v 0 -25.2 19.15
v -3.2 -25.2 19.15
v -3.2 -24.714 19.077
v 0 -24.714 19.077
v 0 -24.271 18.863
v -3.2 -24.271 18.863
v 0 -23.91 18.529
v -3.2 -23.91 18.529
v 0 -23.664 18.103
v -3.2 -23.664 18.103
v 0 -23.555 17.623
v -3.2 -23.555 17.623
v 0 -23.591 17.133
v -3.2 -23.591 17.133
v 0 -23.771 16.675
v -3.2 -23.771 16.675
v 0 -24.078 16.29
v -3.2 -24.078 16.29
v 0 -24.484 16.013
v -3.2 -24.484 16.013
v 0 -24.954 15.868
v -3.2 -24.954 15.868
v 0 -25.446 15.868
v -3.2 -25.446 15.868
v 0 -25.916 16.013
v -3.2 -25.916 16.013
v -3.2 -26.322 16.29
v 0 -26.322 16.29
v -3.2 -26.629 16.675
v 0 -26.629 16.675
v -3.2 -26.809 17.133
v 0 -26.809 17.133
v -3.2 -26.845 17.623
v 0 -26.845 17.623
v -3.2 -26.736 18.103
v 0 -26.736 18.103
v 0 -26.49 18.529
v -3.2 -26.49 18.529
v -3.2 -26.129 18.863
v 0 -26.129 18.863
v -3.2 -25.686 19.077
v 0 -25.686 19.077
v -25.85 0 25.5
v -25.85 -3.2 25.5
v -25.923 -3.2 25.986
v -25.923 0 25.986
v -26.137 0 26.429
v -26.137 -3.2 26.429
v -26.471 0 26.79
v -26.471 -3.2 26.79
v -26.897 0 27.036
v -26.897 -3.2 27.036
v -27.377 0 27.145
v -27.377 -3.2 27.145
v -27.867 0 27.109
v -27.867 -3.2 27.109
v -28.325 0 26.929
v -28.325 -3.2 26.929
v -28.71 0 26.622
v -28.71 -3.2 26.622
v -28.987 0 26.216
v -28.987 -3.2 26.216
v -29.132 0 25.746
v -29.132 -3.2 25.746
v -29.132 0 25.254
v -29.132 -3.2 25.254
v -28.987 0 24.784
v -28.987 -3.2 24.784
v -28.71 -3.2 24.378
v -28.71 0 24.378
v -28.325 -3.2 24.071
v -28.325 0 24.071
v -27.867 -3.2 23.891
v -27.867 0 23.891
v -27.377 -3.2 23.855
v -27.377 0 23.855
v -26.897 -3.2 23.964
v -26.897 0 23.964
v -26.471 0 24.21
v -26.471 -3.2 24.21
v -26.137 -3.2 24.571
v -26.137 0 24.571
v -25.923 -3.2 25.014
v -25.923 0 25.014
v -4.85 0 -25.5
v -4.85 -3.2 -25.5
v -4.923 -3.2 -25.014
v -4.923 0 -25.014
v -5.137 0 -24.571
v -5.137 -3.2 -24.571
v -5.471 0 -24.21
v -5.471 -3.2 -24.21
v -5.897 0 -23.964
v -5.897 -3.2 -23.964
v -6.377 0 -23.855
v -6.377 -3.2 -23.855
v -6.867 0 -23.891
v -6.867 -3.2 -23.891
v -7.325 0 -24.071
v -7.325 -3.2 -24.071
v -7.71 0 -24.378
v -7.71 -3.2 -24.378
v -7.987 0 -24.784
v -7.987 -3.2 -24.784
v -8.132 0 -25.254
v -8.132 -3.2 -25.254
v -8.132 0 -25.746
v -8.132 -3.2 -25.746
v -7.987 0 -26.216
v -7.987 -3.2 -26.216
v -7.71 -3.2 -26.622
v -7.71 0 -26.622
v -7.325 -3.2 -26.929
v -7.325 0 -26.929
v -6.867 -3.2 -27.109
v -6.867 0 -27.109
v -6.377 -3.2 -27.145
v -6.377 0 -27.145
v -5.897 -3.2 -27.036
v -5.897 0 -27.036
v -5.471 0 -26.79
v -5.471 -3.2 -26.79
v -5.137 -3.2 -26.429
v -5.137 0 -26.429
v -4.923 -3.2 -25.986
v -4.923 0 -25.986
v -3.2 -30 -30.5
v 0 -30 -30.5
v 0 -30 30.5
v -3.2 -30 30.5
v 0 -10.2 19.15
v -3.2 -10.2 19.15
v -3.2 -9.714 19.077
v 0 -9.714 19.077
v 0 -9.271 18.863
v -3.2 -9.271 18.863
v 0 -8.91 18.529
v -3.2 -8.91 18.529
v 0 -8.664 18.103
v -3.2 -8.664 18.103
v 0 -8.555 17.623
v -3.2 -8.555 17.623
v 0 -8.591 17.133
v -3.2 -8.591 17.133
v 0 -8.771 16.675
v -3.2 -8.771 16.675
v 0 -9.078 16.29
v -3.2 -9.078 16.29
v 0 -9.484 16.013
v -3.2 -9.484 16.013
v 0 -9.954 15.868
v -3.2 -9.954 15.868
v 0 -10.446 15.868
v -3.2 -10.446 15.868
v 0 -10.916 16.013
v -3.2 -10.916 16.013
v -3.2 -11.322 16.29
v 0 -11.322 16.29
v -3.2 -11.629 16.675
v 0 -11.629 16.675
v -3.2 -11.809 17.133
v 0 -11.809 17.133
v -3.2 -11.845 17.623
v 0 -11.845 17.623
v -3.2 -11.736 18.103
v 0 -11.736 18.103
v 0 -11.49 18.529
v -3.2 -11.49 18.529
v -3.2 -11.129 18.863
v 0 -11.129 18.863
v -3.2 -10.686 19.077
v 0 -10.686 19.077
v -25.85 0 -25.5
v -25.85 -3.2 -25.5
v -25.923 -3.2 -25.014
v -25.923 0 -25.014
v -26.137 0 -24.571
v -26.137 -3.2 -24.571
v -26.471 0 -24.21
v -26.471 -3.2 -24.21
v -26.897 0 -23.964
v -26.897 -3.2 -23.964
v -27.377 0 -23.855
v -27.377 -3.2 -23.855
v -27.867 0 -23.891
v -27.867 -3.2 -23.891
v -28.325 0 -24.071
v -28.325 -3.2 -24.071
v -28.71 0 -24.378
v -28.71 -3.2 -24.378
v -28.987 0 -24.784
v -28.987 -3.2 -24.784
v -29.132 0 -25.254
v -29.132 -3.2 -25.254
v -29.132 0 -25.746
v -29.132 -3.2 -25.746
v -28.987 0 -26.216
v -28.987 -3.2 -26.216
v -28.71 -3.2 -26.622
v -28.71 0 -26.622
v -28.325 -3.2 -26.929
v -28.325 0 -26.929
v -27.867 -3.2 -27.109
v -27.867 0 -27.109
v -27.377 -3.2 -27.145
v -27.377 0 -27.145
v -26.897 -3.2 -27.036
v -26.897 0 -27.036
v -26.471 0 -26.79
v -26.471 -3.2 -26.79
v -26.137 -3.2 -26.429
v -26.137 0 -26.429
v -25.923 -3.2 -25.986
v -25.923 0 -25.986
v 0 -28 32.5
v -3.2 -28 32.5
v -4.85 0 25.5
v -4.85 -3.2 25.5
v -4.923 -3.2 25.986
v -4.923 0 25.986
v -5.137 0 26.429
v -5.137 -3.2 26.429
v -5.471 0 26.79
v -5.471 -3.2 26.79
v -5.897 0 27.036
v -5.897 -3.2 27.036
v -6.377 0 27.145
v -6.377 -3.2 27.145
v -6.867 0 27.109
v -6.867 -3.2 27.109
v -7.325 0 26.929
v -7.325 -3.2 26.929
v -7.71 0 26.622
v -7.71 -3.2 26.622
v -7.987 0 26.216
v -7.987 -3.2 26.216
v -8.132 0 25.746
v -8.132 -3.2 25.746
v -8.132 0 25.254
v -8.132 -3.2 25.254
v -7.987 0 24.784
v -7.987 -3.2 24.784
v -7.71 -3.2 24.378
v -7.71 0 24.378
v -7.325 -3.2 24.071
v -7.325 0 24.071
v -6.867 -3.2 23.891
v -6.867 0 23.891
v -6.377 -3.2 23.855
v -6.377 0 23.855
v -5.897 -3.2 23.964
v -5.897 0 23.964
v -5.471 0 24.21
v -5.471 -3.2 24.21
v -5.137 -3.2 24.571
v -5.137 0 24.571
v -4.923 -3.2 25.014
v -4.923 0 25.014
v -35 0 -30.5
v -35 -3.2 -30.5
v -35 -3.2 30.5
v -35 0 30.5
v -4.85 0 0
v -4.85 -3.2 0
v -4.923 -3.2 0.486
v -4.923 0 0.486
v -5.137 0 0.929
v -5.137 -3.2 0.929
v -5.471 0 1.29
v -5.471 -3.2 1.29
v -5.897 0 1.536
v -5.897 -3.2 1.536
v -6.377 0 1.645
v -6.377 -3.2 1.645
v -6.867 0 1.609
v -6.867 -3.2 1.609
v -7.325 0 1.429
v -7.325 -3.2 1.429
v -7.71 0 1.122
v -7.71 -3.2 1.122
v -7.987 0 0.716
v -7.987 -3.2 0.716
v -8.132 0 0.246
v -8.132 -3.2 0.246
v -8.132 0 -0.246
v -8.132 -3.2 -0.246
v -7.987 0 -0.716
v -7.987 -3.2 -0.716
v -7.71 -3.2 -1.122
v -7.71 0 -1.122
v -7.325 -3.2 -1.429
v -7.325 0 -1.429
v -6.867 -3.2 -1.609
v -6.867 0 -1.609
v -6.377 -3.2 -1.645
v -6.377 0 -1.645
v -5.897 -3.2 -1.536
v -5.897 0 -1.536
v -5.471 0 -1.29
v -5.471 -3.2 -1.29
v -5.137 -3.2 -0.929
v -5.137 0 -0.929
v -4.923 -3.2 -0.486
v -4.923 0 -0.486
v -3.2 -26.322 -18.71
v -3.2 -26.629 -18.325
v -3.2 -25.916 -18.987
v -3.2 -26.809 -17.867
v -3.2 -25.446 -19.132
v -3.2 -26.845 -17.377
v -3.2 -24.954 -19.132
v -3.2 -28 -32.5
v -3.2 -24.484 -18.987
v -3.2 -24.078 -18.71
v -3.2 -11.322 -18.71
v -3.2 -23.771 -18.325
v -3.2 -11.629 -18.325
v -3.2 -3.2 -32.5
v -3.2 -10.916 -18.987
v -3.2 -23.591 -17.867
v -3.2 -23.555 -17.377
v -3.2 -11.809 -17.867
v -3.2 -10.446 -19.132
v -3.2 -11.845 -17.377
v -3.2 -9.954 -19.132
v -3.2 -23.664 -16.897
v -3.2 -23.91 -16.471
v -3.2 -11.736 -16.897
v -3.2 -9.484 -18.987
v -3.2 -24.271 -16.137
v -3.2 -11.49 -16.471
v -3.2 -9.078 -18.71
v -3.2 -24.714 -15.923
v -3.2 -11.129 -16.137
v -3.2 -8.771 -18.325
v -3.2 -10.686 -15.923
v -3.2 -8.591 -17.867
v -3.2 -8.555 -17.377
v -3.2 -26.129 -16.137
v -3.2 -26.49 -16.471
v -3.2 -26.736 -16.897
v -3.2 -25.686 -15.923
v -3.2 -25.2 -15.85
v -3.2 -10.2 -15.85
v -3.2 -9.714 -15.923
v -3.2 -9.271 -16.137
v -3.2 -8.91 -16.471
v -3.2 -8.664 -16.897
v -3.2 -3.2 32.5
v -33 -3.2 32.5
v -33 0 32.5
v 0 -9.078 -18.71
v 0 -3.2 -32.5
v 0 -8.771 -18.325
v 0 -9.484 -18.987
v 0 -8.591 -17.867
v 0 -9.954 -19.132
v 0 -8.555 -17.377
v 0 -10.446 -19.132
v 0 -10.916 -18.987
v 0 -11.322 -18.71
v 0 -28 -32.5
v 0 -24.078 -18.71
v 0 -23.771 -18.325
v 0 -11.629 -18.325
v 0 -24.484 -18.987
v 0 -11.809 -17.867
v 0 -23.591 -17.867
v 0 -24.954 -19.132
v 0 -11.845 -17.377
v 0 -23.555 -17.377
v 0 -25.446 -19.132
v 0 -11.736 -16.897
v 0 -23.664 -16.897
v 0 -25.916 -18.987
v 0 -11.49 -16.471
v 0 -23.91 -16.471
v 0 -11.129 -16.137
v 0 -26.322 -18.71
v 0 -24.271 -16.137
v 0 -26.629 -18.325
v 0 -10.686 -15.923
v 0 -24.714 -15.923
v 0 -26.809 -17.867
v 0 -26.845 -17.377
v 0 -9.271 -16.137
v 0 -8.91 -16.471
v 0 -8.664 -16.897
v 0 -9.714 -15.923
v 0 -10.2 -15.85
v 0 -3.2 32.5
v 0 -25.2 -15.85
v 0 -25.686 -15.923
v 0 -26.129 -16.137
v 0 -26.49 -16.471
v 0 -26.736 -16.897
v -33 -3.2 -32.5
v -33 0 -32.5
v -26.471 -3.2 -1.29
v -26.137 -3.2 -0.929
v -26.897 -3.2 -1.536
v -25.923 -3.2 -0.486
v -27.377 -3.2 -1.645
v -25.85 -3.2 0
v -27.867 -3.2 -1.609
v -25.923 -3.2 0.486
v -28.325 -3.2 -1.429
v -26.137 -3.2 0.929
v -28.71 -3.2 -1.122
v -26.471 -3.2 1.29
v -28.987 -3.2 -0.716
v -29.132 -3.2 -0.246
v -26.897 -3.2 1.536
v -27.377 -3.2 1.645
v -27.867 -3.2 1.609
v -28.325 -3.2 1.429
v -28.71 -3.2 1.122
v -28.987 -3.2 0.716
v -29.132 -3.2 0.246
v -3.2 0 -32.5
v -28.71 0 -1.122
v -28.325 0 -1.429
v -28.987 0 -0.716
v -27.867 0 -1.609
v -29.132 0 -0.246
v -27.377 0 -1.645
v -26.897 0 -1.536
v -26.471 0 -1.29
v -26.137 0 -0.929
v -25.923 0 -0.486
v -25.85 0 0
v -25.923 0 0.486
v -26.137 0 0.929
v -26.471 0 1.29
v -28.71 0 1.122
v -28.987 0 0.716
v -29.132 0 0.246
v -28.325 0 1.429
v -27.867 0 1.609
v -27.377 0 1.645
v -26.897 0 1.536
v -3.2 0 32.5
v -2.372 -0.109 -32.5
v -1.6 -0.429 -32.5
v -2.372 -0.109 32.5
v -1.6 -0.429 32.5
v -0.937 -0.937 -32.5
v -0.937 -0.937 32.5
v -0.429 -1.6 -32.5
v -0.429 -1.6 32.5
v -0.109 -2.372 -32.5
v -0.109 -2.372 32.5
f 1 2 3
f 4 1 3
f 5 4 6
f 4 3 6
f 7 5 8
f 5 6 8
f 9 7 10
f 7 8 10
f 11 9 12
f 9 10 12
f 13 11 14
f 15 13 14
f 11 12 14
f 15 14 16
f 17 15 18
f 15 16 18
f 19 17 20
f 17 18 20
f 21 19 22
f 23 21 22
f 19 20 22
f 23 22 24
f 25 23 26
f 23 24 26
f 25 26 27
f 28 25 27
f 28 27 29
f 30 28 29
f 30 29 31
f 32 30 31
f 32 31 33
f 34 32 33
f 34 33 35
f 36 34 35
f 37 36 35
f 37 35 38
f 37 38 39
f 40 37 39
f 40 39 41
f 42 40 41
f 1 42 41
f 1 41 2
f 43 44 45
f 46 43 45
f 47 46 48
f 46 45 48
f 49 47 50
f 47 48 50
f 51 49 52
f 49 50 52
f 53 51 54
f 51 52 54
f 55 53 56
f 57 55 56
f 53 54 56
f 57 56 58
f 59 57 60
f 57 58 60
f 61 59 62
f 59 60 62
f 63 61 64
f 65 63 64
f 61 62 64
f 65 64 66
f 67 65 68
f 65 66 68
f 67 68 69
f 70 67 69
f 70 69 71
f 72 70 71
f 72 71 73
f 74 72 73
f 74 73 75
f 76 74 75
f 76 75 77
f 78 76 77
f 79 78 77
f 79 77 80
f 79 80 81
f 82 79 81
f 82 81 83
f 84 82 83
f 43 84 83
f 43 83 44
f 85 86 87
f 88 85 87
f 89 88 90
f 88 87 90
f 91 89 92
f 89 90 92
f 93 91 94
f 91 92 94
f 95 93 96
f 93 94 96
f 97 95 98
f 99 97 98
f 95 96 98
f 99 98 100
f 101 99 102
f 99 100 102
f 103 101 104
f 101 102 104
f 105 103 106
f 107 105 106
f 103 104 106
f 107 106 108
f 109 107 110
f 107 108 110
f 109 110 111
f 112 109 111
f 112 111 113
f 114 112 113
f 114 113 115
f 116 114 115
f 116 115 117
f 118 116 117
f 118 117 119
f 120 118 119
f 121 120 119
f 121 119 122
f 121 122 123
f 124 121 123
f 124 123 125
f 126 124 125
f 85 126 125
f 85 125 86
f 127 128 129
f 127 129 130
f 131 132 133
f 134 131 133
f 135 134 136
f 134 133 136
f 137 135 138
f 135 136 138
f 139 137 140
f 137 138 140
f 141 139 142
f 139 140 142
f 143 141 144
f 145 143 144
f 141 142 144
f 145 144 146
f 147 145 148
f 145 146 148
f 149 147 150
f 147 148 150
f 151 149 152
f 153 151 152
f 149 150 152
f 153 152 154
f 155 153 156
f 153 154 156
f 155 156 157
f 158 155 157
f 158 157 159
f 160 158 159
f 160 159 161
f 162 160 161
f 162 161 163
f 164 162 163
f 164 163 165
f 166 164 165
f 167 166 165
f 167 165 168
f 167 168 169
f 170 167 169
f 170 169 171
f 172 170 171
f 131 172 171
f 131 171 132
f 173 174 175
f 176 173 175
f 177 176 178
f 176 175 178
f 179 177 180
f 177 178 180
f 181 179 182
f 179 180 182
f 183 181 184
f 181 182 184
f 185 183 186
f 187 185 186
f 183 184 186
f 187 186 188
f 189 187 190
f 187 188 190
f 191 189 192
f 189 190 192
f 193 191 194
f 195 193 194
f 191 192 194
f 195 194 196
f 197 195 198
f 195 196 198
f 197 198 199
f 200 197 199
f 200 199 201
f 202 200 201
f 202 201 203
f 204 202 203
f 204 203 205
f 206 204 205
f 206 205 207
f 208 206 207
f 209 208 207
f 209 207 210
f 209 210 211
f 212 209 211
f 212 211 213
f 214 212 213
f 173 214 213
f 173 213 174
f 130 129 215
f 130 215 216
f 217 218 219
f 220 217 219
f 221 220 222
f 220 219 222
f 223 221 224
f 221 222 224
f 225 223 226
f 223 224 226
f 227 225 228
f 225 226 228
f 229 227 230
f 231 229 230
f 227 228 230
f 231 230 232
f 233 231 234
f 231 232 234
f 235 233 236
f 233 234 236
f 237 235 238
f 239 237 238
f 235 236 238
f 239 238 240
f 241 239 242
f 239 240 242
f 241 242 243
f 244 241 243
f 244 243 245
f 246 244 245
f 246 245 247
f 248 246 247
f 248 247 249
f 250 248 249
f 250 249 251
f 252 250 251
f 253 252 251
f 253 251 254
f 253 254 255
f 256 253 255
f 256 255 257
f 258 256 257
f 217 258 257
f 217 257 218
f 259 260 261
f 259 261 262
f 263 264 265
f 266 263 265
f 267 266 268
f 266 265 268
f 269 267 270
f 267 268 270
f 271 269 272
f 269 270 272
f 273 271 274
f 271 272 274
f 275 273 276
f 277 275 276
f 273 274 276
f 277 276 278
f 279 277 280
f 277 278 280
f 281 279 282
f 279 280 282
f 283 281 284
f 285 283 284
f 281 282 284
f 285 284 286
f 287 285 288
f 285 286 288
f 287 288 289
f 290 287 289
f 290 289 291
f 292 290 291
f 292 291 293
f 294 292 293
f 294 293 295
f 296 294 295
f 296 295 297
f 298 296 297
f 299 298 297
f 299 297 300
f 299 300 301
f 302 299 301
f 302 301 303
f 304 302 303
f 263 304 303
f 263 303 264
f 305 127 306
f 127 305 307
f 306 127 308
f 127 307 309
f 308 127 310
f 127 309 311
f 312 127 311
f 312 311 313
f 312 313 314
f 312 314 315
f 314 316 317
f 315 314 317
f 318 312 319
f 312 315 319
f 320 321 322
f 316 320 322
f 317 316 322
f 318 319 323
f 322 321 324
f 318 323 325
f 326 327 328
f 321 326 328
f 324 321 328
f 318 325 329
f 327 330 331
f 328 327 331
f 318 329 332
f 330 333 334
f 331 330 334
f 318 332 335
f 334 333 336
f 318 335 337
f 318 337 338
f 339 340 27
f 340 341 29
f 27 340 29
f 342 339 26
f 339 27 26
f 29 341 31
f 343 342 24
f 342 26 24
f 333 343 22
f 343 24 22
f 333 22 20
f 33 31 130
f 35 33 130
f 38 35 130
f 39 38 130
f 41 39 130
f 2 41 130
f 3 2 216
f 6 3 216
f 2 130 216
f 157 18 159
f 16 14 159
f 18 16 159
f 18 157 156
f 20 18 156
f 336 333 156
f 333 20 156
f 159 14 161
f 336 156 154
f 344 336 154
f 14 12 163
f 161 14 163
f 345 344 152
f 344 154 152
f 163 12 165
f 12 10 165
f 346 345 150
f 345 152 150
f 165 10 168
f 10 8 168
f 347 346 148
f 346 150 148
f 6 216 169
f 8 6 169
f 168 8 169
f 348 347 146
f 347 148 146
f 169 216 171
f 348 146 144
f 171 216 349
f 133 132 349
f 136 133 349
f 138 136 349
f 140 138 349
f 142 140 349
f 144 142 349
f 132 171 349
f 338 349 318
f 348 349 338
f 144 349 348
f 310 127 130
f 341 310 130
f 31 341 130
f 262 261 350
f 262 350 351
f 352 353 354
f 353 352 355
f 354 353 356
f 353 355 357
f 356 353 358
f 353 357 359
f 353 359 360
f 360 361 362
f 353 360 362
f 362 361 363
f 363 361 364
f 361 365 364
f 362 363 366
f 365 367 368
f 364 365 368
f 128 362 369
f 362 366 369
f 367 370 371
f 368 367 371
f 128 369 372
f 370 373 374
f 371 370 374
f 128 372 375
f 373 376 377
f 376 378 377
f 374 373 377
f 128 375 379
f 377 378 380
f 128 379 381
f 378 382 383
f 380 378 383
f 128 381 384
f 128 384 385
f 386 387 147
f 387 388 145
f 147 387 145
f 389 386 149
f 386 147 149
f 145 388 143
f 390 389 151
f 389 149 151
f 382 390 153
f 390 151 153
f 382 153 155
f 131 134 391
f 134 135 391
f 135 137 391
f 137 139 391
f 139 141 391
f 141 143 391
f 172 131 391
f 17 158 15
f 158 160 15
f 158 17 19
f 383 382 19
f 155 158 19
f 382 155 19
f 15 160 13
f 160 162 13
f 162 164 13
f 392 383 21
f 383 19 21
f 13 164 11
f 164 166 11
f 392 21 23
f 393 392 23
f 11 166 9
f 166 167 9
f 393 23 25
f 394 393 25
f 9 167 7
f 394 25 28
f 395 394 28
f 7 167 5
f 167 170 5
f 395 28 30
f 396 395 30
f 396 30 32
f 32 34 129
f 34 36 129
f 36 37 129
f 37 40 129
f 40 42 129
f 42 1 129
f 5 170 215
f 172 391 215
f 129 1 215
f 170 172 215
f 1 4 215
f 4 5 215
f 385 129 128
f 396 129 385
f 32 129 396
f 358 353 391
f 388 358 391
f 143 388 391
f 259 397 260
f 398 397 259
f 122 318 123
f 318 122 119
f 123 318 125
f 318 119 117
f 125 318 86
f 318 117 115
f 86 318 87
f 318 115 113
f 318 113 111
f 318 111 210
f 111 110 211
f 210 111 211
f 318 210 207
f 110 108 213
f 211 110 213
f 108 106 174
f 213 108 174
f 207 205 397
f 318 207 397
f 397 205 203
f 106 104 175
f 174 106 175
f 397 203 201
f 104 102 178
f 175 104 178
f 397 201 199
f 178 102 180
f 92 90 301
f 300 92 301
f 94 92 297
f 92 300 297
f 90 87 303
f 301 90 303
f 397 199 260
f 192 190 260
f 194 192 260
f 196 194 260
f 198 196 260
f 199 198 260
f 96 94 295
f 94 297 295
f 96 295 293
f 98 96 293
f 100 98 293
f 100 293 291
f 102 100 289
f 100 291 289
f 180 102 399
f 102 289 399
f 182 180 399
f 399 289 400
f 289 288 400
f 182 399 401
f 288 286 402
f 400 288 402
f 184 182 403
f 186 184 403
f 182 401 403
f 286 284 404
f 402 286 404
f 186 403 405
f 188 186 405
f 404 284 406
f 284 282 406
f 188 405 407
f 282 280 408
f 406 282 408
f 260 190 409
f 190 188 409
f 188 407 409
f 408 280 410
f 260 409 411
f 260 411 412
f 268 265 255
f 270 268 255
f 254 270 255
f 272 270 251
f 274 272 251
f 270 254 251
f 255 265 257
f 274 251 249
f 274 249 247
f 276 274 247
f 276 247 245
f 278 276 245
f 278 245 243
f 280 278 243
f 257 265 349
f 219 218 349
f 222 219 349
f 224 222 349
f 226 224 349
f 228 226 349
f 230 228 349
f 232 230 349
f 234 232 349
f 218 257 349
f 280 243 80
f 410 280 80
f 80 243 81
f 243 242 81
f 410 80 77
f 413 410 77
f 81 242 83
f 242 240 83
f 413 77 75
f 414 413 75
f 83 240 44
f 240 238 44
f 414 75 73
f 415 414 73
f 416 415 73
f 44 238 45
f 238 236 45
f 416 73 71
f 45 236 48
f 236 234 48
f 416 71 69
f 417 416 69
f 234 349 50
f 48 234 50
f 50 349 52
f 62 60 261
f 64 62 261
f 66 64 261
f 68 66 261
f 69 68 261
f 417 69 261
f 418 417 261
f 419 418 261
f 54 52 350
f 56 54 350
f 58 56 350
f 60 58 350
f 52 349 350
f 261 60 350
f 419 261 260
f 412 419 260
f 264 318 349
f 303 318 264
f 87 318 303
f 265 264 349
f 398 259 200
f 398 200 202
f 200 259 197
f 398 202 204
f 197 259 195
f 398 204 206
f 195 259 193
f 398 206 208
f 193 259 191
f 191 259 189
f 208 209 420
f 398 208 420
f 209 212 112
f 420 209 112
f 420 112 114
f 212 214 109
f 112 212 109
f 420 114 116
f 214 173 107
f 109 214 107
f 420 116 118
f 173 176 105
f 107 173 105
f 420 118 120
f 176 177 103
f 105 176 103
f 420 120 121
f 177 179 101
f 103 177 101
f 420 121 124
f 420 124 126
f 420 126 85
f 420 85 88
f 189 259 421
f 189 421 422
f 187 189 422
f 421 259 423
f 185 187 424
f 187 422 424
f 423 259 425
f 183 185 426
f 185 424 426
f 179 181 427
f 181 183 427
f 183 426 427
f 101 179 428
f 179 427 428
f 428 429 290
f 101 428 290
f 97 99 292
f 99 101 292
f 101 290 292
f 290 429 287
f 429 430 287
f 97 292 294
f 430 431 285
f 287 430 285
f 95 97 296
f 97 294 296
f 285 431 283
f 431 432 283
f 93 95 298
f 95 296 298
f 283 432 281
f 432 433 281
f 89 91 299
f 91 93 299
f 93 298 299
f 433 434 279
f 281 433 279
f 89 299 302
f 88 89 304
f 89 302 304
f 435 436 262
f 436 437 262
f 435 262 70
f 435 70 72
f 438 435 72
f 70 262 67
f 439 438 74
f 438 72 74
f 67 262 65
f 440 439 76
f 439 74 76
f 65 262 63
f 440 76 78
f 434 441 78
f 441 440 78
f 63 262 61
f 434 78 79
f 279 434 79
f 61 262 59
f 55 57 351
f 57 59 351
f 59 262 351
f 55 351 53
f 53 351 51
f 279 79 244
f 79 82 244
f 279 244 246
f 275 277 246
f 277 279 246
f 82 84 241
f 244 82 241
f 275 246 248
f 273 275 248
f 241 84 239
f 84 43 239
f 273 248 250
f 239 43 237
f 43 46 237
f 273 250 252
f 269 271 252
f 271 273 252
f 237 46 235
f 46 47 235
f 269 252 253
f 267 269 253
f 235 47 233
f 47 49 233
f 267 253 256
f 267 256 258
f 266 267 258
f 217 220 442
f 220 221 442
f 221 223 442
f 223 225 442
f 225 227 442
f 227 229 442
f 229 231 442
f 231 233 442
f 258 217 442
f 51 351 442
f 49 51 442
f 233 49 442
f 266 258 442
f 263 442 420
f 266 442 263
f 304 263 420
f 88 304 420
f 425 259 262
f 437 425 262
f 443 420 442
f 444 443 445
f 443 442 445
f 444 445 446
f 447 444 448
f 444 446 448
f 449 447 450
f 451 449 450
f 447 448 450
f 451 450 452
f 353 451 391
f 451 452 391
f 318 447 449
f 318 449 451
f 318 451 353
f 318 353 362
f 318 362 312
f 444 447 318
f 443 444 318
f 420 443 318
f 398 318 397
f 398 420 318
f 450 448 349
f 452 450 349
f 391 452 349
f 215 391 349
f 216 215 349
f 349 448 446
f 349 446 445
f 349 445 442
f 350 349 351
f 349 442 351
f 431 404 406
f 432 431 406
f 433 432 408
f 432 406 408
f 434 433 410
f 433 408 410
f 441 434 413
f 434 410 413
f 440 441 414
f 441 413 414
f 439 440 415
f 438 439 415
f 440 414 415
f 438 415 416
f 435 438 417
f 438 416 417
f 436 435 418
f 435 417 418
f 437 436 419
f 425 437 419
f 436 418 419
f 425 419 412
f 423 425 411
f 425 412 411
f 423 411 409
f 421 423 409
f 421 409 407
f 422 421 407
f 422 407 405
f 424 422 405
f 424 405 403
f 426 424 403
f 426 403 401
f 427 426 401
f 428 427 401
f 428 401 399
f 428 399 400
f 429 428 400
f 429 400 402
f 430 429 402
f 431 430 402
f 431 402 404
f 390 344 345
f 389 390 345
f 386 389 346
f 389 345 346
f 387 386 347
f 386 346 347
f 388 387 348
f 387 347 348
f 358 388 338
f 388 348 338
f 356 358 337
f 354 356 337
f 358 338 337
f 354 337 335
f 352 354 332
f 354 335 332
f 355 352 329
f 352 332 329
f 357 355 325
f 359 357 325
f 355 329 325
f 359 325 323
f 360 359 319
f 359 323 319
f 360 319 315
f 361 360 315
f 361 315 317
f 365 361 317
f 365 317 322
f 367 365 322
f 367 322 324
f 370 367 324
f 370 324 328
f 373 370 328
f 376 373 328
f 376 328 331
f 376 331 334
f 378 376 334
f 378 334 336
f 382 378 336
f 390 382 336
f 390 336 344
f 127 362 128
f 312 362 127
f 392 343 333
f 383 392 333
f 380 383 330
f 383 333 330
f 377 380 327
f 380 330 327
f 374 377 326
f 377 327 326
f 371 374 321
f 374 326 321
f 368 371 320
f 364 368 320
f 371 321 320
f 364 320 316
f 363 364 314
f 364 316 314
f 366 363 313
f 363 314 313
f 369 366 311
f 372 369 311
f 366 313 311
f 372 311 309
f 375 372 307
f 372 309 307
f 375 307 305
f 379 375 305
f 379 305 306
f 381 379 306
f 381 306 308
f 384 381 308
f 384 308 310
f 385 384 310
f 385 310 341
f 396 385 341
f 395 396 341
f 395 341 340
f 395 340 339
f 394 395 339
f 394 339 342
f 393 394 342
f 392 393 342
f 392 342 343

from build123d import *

# Parameters (mm, degrees)
BOSS_EXTRUDE1_DEPTH       = 32.5
BOSS_EXTRUDE1_DEPTH_BACK  = 32.5
FILLET1_R                 = 3.2
M4X0_7_TAPPED_HOLE1_D     = 3.3
M4X0_7_TAPPED_HOLE1_DEPTH = 3.2
M4X0_7_TAPPED_HOLE2_D     = 3.3
M4X0_7_TAPPED_HOLE2_DEPTH = 3.2
LPATTERN1_COUNT           = 2
LPATTERN1_PITCH           = 21
LPATTERN1_COUNT_DIR2      = 3
LPATTERN1_PITCH_DIR2      = 25.5
CHAMFER1_SIZE             = 2


with BuildPart() as part:
    # Sketch1 → Boss-Extrude1 (new body, two sides)
    with BuildSketch(Plane.XY) as boss_extrude1_sk:
        Polygon((0, -30), (-3.2, -30), (-3.2, -3.2), (-35, -3.2), (-35, 0), (0, 0), align=None)
    extrude(amount=BOSS_EXTRUDE1_DEPTH)
    extrude(boss_extrude1_sk.sketch, amount=-BOSS_EXTRUDE1_DEPTH_BACK)

    # Fillet1
    fillet1_edges = [part.edges().sort_by_distance(p)[0] for p in [
        (0, 0, 0),
    ]]
    fillet(fillet1_edges, radius=FILLET1_R)

    # M4x0.7 Tapped Hole1
    with Locations(Plane(origin=(0, 0, 0), x_dir=(0, 0, -1), z_dir=(1, 0, 0))):
        with Locations((-17.5, -10.2), (-17.5, -25.2), (17.5, -25.2), (17.5, -10.2)):
            Hole(M4X0_7_TAPPED_HOLE1_D / 2, depth=M4X0_7_TAPPED_HOLE1_DEPTH)

    # M4x0.7 Tapped Hole2
    with Locations(Plane(origin=(0, 0, 0), x_dir=(-1, 0, 0), z_dir=(0, 1, 0))):
        with Locations((6.5, 25.5)):
            m4x0_7_tapped_hole2 = Hole(M4X0_7_TAPPED_HOLE2_D / 2, depth=M4X0_7_TAPPED_HOLE2_DEPTH)

    # LPattern1: M4x0.7 Tapped Hole2 2 × 3
    with Locations(*[(-i * LPATTERN1_PITCH, 0, -j * LPATTERN1_PITCH_DIR2) for i in range(LPATTERN1_COUNT) for j in range(LPATTERN1_COUNT_DIR2) if (i, j) != (0, 0)]):
        add(m4x0_7_tapped_hole2, mode=Mode.SUBTRACT)

    # Chamfer1
    chamfer1_edges = [part.edges().sort_by_distance(p)[0] for p in [
        (-35, -1.6, -32.5),
        (-35, -1.6, 32.5),
        (-1.6, -30, -32.5),
        (-1.6, -30, 32.5),
    ]]
    chamfer(chamfer1_edges, length=CHAMFER1_SIZE)


solid = part.part
